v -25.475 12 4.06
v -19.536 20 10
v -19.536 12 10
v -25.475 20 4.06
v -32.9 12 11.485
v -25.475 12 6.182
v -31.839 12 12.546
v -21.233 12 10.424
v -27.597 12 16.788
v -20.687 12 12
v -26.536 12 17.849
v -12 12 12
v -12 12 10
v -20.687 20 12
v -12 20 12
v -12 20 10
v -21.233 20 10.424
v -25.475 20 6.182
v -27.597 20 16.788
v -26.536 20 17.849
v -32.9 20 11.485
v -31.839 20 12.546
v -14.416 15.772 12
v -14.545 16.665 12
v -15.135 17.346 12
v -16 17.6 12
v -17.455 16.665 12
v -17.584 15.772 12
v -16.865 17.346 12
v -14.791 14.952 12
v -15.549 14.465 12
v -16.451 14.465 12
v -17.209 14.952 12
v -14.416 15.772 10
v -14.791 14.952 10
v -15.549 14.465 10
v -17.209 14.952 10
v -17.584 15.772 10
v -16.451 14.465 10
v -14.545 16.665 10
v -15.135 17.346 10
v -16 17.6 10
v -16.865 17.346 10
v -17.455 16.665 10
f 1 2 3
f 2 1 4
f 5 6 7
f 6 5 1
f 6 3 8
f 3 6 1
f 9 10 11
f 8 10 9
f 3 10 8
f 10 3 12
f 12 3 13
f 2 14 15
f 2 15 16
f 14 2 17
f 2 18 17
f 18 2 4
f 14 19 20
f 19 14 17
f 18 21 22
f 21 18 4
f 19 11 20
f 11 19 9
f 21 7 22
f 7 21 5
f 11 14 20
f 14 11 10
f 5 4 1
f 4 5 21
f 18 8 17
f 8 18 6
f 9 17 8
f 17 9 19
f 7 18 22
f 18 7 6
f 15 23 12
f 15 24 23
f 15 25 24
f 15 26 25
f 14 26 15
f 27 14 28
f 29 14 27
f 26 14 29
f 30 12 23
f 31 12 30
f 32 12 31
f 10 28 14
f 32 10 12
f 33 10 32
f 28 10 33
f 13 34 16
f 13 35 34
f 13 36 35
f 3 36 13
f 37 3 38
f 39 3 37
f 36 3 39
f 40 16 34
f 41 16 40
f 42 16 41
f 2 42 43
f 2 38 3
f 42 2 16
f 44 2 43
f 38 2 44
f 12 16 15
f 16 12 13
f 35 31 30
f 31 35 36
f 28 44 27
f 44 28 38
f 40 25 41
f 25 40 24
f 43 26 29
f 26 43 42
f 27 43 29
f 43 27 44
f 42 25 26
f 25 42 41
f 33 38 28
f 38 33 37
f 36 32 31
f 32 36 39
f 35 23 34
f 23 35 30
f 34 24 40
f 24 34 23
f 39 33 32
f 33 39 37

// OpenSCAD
// file: ../vitamin/fan.scad
/*
 * fan
 *
 * Copyright 2013 <b@Zi.iS>
 * License CC BY 3.0
 */

include <../config.scad>;

fan();

module fan(
	size = fan40
) {
	echo("Fan ", size[0], "mm");
	color([.3,.3,.3]) {
		difference() {
			hull() {
				for(x=[0:1]) {
					for(y=[0:1]) {
						translate([
							-size[2]/2 + size[2] * x,
							-size[2]/2 + size[2] * y,
							0
						]) {
							cylinder(
								r = (size[0] - size[2])/2,
								h = size[1]
							);
						}
					}
				}
			}
			for(x=[0:1]) {
				for(y=[0:1]) {
					translate([
						-size[2]/2 + size[2] * x,
						-size[2]/2 + size[2] * y,
						0
					]) {
						e() cylinder(
							r = m_pilot(size[3]),
							h = size[1]
						);
					}
				}
			}
			e() cylinder(
				r = size[0]/2*.9,
				h = size[1]
			);
		}
	}

	color([.7,.7,.7]) {
		cylinder(
			r = size[0]/2*.4,
			h = size[1]
		);
		linear_extrude(
			twist=30,
			height =  size[1]
		) {
			square(center=true, [size[0]*.8,1]);
			square(center=true, [1, size[0]*.8]);
		}
	}
}
// file: ../config.scad
/*
 * config
 *
 * Copyright 2013 <b@Zi.iS>
 * License CC BY 3.0
 */

$fa = 1;
$fs = 1;
preview = 1;

// preview colors
color_steal = [.8,.8,.8];
color_wood = [.3,.3,0];
color_print = [0,.8,0];

// metric bolt sizes
function m_hole(size) = size*1.1/2;
function m_pilot(size) = size*.9/2;

mounting_bolt = 3;

// slightly move and slightly elongate objects in preview to overcome scad rounding errors
module e() {
	if(preview==1) {
		translate([
			0,
			0,
			-.1
		]) {
			scale([
				1,
				1,
				1.1
			]) {
				child();
			}
		}
	} else {
		child();
	}
}

module m_washer(
	size = 3
) {
	color(color_steal) {
		difference() {
			cylinder(
				r = size/2*2,
				h = size*.2
			);
			e() cylinder(
				r = size/2,
				h = size*.2
			);
		}
	}
	translate([
		0,
		0,
		size*.2
	]) {
		child();
	}
}

module m_nut(
	size = 3
) {
	color(color_steal) {
		difference() {
			cylinder(
				r = size*1.8/2,
				h = size*.8,
				$fn = 6
			);
		}
	}
	translate([
		0,
		0,
		size*.8
	]) {
		child();
	}
}

module m_nylock(
	size = 3
) {
	color(color_steal) {
		difference() {
			cylinder(
				r = size*1.8/2,
				h = size,
				$fn = 6
			);
		}
	}
	translate([
		0,
		0,
		size
	]) {
		child();
	}
}

module screw(
	r = 1,
	h = 1,
	pitch = 5,
) {
	linear_extrude(
		height = h,
		twist = -h/pitch*360
	) {
		translate([pitch/5,0,0]) { //H=.2*p works better in plastic then ISO's H=.866*p
			circle(
				r=r 
			);
		}
	}
}

fan40 = [
	40,			//width/length
	10,			//height
	32,			//bolt pitch
	3,			//bolt
];

lm8uu = [
	15.2/2,	//outside
	8/2,	//inside
	26,		//length
];
// main file
/*
 * fan mount
 *
 * Copyright 2013 <b@Zi.iS>
 * License CC BY 3.0
 */

include <../config.scad>
use <../vitamin/fan.scad>

if(preview==1) {
	%fan();
	fan_mount();
} else {
	rotate([
		90,
		0,
		0,
	]) {
		fan_mount();
	}
}

module fan_mount(
	size = fan40,
	thickness = 6
) {
	color([0,.5,0]) {
		translate([
			-size[2]/2,
			size[0]/2,
			size[1]
		]) {
			rotate([
				0,
				-90,
				90
			]) {
				rotate([
					0,
					0,
					-135,
				]) {
					translate([
						-13,
						-9.4-1.5,
						0
					]) {
						difference() {
							cube([
								10.5,
								9,
								(size[0]-size[2])
							]);
							translate([
								-1,
								(9-thickness)/2,
								-1
							]) {
								cube([
									10,
									thickness,
									(size[0]-size[2])+2
								]);
							}
						}
					}
				}
			
				translate([
					0,
					0,
					(size[0]-size[2])/2
				]) {
					difference() {
						translate([
							0,
							-(size[0]-size[2])/2,
							-(size[0]-size[2])/2,
						]) {
							cube([
								2,
								(size[0]-size[2])+1,
								(size[0]-size[2])
							]);
						}
						rotate([
							0,
							90,
							0
						]) {
							//pilot
							translate([0,0,-1]) {
								cylinder(
									r = 3.2/2,
									h = 5
								);
							}						
						}
					}
				}
			}
		}
	}
}
